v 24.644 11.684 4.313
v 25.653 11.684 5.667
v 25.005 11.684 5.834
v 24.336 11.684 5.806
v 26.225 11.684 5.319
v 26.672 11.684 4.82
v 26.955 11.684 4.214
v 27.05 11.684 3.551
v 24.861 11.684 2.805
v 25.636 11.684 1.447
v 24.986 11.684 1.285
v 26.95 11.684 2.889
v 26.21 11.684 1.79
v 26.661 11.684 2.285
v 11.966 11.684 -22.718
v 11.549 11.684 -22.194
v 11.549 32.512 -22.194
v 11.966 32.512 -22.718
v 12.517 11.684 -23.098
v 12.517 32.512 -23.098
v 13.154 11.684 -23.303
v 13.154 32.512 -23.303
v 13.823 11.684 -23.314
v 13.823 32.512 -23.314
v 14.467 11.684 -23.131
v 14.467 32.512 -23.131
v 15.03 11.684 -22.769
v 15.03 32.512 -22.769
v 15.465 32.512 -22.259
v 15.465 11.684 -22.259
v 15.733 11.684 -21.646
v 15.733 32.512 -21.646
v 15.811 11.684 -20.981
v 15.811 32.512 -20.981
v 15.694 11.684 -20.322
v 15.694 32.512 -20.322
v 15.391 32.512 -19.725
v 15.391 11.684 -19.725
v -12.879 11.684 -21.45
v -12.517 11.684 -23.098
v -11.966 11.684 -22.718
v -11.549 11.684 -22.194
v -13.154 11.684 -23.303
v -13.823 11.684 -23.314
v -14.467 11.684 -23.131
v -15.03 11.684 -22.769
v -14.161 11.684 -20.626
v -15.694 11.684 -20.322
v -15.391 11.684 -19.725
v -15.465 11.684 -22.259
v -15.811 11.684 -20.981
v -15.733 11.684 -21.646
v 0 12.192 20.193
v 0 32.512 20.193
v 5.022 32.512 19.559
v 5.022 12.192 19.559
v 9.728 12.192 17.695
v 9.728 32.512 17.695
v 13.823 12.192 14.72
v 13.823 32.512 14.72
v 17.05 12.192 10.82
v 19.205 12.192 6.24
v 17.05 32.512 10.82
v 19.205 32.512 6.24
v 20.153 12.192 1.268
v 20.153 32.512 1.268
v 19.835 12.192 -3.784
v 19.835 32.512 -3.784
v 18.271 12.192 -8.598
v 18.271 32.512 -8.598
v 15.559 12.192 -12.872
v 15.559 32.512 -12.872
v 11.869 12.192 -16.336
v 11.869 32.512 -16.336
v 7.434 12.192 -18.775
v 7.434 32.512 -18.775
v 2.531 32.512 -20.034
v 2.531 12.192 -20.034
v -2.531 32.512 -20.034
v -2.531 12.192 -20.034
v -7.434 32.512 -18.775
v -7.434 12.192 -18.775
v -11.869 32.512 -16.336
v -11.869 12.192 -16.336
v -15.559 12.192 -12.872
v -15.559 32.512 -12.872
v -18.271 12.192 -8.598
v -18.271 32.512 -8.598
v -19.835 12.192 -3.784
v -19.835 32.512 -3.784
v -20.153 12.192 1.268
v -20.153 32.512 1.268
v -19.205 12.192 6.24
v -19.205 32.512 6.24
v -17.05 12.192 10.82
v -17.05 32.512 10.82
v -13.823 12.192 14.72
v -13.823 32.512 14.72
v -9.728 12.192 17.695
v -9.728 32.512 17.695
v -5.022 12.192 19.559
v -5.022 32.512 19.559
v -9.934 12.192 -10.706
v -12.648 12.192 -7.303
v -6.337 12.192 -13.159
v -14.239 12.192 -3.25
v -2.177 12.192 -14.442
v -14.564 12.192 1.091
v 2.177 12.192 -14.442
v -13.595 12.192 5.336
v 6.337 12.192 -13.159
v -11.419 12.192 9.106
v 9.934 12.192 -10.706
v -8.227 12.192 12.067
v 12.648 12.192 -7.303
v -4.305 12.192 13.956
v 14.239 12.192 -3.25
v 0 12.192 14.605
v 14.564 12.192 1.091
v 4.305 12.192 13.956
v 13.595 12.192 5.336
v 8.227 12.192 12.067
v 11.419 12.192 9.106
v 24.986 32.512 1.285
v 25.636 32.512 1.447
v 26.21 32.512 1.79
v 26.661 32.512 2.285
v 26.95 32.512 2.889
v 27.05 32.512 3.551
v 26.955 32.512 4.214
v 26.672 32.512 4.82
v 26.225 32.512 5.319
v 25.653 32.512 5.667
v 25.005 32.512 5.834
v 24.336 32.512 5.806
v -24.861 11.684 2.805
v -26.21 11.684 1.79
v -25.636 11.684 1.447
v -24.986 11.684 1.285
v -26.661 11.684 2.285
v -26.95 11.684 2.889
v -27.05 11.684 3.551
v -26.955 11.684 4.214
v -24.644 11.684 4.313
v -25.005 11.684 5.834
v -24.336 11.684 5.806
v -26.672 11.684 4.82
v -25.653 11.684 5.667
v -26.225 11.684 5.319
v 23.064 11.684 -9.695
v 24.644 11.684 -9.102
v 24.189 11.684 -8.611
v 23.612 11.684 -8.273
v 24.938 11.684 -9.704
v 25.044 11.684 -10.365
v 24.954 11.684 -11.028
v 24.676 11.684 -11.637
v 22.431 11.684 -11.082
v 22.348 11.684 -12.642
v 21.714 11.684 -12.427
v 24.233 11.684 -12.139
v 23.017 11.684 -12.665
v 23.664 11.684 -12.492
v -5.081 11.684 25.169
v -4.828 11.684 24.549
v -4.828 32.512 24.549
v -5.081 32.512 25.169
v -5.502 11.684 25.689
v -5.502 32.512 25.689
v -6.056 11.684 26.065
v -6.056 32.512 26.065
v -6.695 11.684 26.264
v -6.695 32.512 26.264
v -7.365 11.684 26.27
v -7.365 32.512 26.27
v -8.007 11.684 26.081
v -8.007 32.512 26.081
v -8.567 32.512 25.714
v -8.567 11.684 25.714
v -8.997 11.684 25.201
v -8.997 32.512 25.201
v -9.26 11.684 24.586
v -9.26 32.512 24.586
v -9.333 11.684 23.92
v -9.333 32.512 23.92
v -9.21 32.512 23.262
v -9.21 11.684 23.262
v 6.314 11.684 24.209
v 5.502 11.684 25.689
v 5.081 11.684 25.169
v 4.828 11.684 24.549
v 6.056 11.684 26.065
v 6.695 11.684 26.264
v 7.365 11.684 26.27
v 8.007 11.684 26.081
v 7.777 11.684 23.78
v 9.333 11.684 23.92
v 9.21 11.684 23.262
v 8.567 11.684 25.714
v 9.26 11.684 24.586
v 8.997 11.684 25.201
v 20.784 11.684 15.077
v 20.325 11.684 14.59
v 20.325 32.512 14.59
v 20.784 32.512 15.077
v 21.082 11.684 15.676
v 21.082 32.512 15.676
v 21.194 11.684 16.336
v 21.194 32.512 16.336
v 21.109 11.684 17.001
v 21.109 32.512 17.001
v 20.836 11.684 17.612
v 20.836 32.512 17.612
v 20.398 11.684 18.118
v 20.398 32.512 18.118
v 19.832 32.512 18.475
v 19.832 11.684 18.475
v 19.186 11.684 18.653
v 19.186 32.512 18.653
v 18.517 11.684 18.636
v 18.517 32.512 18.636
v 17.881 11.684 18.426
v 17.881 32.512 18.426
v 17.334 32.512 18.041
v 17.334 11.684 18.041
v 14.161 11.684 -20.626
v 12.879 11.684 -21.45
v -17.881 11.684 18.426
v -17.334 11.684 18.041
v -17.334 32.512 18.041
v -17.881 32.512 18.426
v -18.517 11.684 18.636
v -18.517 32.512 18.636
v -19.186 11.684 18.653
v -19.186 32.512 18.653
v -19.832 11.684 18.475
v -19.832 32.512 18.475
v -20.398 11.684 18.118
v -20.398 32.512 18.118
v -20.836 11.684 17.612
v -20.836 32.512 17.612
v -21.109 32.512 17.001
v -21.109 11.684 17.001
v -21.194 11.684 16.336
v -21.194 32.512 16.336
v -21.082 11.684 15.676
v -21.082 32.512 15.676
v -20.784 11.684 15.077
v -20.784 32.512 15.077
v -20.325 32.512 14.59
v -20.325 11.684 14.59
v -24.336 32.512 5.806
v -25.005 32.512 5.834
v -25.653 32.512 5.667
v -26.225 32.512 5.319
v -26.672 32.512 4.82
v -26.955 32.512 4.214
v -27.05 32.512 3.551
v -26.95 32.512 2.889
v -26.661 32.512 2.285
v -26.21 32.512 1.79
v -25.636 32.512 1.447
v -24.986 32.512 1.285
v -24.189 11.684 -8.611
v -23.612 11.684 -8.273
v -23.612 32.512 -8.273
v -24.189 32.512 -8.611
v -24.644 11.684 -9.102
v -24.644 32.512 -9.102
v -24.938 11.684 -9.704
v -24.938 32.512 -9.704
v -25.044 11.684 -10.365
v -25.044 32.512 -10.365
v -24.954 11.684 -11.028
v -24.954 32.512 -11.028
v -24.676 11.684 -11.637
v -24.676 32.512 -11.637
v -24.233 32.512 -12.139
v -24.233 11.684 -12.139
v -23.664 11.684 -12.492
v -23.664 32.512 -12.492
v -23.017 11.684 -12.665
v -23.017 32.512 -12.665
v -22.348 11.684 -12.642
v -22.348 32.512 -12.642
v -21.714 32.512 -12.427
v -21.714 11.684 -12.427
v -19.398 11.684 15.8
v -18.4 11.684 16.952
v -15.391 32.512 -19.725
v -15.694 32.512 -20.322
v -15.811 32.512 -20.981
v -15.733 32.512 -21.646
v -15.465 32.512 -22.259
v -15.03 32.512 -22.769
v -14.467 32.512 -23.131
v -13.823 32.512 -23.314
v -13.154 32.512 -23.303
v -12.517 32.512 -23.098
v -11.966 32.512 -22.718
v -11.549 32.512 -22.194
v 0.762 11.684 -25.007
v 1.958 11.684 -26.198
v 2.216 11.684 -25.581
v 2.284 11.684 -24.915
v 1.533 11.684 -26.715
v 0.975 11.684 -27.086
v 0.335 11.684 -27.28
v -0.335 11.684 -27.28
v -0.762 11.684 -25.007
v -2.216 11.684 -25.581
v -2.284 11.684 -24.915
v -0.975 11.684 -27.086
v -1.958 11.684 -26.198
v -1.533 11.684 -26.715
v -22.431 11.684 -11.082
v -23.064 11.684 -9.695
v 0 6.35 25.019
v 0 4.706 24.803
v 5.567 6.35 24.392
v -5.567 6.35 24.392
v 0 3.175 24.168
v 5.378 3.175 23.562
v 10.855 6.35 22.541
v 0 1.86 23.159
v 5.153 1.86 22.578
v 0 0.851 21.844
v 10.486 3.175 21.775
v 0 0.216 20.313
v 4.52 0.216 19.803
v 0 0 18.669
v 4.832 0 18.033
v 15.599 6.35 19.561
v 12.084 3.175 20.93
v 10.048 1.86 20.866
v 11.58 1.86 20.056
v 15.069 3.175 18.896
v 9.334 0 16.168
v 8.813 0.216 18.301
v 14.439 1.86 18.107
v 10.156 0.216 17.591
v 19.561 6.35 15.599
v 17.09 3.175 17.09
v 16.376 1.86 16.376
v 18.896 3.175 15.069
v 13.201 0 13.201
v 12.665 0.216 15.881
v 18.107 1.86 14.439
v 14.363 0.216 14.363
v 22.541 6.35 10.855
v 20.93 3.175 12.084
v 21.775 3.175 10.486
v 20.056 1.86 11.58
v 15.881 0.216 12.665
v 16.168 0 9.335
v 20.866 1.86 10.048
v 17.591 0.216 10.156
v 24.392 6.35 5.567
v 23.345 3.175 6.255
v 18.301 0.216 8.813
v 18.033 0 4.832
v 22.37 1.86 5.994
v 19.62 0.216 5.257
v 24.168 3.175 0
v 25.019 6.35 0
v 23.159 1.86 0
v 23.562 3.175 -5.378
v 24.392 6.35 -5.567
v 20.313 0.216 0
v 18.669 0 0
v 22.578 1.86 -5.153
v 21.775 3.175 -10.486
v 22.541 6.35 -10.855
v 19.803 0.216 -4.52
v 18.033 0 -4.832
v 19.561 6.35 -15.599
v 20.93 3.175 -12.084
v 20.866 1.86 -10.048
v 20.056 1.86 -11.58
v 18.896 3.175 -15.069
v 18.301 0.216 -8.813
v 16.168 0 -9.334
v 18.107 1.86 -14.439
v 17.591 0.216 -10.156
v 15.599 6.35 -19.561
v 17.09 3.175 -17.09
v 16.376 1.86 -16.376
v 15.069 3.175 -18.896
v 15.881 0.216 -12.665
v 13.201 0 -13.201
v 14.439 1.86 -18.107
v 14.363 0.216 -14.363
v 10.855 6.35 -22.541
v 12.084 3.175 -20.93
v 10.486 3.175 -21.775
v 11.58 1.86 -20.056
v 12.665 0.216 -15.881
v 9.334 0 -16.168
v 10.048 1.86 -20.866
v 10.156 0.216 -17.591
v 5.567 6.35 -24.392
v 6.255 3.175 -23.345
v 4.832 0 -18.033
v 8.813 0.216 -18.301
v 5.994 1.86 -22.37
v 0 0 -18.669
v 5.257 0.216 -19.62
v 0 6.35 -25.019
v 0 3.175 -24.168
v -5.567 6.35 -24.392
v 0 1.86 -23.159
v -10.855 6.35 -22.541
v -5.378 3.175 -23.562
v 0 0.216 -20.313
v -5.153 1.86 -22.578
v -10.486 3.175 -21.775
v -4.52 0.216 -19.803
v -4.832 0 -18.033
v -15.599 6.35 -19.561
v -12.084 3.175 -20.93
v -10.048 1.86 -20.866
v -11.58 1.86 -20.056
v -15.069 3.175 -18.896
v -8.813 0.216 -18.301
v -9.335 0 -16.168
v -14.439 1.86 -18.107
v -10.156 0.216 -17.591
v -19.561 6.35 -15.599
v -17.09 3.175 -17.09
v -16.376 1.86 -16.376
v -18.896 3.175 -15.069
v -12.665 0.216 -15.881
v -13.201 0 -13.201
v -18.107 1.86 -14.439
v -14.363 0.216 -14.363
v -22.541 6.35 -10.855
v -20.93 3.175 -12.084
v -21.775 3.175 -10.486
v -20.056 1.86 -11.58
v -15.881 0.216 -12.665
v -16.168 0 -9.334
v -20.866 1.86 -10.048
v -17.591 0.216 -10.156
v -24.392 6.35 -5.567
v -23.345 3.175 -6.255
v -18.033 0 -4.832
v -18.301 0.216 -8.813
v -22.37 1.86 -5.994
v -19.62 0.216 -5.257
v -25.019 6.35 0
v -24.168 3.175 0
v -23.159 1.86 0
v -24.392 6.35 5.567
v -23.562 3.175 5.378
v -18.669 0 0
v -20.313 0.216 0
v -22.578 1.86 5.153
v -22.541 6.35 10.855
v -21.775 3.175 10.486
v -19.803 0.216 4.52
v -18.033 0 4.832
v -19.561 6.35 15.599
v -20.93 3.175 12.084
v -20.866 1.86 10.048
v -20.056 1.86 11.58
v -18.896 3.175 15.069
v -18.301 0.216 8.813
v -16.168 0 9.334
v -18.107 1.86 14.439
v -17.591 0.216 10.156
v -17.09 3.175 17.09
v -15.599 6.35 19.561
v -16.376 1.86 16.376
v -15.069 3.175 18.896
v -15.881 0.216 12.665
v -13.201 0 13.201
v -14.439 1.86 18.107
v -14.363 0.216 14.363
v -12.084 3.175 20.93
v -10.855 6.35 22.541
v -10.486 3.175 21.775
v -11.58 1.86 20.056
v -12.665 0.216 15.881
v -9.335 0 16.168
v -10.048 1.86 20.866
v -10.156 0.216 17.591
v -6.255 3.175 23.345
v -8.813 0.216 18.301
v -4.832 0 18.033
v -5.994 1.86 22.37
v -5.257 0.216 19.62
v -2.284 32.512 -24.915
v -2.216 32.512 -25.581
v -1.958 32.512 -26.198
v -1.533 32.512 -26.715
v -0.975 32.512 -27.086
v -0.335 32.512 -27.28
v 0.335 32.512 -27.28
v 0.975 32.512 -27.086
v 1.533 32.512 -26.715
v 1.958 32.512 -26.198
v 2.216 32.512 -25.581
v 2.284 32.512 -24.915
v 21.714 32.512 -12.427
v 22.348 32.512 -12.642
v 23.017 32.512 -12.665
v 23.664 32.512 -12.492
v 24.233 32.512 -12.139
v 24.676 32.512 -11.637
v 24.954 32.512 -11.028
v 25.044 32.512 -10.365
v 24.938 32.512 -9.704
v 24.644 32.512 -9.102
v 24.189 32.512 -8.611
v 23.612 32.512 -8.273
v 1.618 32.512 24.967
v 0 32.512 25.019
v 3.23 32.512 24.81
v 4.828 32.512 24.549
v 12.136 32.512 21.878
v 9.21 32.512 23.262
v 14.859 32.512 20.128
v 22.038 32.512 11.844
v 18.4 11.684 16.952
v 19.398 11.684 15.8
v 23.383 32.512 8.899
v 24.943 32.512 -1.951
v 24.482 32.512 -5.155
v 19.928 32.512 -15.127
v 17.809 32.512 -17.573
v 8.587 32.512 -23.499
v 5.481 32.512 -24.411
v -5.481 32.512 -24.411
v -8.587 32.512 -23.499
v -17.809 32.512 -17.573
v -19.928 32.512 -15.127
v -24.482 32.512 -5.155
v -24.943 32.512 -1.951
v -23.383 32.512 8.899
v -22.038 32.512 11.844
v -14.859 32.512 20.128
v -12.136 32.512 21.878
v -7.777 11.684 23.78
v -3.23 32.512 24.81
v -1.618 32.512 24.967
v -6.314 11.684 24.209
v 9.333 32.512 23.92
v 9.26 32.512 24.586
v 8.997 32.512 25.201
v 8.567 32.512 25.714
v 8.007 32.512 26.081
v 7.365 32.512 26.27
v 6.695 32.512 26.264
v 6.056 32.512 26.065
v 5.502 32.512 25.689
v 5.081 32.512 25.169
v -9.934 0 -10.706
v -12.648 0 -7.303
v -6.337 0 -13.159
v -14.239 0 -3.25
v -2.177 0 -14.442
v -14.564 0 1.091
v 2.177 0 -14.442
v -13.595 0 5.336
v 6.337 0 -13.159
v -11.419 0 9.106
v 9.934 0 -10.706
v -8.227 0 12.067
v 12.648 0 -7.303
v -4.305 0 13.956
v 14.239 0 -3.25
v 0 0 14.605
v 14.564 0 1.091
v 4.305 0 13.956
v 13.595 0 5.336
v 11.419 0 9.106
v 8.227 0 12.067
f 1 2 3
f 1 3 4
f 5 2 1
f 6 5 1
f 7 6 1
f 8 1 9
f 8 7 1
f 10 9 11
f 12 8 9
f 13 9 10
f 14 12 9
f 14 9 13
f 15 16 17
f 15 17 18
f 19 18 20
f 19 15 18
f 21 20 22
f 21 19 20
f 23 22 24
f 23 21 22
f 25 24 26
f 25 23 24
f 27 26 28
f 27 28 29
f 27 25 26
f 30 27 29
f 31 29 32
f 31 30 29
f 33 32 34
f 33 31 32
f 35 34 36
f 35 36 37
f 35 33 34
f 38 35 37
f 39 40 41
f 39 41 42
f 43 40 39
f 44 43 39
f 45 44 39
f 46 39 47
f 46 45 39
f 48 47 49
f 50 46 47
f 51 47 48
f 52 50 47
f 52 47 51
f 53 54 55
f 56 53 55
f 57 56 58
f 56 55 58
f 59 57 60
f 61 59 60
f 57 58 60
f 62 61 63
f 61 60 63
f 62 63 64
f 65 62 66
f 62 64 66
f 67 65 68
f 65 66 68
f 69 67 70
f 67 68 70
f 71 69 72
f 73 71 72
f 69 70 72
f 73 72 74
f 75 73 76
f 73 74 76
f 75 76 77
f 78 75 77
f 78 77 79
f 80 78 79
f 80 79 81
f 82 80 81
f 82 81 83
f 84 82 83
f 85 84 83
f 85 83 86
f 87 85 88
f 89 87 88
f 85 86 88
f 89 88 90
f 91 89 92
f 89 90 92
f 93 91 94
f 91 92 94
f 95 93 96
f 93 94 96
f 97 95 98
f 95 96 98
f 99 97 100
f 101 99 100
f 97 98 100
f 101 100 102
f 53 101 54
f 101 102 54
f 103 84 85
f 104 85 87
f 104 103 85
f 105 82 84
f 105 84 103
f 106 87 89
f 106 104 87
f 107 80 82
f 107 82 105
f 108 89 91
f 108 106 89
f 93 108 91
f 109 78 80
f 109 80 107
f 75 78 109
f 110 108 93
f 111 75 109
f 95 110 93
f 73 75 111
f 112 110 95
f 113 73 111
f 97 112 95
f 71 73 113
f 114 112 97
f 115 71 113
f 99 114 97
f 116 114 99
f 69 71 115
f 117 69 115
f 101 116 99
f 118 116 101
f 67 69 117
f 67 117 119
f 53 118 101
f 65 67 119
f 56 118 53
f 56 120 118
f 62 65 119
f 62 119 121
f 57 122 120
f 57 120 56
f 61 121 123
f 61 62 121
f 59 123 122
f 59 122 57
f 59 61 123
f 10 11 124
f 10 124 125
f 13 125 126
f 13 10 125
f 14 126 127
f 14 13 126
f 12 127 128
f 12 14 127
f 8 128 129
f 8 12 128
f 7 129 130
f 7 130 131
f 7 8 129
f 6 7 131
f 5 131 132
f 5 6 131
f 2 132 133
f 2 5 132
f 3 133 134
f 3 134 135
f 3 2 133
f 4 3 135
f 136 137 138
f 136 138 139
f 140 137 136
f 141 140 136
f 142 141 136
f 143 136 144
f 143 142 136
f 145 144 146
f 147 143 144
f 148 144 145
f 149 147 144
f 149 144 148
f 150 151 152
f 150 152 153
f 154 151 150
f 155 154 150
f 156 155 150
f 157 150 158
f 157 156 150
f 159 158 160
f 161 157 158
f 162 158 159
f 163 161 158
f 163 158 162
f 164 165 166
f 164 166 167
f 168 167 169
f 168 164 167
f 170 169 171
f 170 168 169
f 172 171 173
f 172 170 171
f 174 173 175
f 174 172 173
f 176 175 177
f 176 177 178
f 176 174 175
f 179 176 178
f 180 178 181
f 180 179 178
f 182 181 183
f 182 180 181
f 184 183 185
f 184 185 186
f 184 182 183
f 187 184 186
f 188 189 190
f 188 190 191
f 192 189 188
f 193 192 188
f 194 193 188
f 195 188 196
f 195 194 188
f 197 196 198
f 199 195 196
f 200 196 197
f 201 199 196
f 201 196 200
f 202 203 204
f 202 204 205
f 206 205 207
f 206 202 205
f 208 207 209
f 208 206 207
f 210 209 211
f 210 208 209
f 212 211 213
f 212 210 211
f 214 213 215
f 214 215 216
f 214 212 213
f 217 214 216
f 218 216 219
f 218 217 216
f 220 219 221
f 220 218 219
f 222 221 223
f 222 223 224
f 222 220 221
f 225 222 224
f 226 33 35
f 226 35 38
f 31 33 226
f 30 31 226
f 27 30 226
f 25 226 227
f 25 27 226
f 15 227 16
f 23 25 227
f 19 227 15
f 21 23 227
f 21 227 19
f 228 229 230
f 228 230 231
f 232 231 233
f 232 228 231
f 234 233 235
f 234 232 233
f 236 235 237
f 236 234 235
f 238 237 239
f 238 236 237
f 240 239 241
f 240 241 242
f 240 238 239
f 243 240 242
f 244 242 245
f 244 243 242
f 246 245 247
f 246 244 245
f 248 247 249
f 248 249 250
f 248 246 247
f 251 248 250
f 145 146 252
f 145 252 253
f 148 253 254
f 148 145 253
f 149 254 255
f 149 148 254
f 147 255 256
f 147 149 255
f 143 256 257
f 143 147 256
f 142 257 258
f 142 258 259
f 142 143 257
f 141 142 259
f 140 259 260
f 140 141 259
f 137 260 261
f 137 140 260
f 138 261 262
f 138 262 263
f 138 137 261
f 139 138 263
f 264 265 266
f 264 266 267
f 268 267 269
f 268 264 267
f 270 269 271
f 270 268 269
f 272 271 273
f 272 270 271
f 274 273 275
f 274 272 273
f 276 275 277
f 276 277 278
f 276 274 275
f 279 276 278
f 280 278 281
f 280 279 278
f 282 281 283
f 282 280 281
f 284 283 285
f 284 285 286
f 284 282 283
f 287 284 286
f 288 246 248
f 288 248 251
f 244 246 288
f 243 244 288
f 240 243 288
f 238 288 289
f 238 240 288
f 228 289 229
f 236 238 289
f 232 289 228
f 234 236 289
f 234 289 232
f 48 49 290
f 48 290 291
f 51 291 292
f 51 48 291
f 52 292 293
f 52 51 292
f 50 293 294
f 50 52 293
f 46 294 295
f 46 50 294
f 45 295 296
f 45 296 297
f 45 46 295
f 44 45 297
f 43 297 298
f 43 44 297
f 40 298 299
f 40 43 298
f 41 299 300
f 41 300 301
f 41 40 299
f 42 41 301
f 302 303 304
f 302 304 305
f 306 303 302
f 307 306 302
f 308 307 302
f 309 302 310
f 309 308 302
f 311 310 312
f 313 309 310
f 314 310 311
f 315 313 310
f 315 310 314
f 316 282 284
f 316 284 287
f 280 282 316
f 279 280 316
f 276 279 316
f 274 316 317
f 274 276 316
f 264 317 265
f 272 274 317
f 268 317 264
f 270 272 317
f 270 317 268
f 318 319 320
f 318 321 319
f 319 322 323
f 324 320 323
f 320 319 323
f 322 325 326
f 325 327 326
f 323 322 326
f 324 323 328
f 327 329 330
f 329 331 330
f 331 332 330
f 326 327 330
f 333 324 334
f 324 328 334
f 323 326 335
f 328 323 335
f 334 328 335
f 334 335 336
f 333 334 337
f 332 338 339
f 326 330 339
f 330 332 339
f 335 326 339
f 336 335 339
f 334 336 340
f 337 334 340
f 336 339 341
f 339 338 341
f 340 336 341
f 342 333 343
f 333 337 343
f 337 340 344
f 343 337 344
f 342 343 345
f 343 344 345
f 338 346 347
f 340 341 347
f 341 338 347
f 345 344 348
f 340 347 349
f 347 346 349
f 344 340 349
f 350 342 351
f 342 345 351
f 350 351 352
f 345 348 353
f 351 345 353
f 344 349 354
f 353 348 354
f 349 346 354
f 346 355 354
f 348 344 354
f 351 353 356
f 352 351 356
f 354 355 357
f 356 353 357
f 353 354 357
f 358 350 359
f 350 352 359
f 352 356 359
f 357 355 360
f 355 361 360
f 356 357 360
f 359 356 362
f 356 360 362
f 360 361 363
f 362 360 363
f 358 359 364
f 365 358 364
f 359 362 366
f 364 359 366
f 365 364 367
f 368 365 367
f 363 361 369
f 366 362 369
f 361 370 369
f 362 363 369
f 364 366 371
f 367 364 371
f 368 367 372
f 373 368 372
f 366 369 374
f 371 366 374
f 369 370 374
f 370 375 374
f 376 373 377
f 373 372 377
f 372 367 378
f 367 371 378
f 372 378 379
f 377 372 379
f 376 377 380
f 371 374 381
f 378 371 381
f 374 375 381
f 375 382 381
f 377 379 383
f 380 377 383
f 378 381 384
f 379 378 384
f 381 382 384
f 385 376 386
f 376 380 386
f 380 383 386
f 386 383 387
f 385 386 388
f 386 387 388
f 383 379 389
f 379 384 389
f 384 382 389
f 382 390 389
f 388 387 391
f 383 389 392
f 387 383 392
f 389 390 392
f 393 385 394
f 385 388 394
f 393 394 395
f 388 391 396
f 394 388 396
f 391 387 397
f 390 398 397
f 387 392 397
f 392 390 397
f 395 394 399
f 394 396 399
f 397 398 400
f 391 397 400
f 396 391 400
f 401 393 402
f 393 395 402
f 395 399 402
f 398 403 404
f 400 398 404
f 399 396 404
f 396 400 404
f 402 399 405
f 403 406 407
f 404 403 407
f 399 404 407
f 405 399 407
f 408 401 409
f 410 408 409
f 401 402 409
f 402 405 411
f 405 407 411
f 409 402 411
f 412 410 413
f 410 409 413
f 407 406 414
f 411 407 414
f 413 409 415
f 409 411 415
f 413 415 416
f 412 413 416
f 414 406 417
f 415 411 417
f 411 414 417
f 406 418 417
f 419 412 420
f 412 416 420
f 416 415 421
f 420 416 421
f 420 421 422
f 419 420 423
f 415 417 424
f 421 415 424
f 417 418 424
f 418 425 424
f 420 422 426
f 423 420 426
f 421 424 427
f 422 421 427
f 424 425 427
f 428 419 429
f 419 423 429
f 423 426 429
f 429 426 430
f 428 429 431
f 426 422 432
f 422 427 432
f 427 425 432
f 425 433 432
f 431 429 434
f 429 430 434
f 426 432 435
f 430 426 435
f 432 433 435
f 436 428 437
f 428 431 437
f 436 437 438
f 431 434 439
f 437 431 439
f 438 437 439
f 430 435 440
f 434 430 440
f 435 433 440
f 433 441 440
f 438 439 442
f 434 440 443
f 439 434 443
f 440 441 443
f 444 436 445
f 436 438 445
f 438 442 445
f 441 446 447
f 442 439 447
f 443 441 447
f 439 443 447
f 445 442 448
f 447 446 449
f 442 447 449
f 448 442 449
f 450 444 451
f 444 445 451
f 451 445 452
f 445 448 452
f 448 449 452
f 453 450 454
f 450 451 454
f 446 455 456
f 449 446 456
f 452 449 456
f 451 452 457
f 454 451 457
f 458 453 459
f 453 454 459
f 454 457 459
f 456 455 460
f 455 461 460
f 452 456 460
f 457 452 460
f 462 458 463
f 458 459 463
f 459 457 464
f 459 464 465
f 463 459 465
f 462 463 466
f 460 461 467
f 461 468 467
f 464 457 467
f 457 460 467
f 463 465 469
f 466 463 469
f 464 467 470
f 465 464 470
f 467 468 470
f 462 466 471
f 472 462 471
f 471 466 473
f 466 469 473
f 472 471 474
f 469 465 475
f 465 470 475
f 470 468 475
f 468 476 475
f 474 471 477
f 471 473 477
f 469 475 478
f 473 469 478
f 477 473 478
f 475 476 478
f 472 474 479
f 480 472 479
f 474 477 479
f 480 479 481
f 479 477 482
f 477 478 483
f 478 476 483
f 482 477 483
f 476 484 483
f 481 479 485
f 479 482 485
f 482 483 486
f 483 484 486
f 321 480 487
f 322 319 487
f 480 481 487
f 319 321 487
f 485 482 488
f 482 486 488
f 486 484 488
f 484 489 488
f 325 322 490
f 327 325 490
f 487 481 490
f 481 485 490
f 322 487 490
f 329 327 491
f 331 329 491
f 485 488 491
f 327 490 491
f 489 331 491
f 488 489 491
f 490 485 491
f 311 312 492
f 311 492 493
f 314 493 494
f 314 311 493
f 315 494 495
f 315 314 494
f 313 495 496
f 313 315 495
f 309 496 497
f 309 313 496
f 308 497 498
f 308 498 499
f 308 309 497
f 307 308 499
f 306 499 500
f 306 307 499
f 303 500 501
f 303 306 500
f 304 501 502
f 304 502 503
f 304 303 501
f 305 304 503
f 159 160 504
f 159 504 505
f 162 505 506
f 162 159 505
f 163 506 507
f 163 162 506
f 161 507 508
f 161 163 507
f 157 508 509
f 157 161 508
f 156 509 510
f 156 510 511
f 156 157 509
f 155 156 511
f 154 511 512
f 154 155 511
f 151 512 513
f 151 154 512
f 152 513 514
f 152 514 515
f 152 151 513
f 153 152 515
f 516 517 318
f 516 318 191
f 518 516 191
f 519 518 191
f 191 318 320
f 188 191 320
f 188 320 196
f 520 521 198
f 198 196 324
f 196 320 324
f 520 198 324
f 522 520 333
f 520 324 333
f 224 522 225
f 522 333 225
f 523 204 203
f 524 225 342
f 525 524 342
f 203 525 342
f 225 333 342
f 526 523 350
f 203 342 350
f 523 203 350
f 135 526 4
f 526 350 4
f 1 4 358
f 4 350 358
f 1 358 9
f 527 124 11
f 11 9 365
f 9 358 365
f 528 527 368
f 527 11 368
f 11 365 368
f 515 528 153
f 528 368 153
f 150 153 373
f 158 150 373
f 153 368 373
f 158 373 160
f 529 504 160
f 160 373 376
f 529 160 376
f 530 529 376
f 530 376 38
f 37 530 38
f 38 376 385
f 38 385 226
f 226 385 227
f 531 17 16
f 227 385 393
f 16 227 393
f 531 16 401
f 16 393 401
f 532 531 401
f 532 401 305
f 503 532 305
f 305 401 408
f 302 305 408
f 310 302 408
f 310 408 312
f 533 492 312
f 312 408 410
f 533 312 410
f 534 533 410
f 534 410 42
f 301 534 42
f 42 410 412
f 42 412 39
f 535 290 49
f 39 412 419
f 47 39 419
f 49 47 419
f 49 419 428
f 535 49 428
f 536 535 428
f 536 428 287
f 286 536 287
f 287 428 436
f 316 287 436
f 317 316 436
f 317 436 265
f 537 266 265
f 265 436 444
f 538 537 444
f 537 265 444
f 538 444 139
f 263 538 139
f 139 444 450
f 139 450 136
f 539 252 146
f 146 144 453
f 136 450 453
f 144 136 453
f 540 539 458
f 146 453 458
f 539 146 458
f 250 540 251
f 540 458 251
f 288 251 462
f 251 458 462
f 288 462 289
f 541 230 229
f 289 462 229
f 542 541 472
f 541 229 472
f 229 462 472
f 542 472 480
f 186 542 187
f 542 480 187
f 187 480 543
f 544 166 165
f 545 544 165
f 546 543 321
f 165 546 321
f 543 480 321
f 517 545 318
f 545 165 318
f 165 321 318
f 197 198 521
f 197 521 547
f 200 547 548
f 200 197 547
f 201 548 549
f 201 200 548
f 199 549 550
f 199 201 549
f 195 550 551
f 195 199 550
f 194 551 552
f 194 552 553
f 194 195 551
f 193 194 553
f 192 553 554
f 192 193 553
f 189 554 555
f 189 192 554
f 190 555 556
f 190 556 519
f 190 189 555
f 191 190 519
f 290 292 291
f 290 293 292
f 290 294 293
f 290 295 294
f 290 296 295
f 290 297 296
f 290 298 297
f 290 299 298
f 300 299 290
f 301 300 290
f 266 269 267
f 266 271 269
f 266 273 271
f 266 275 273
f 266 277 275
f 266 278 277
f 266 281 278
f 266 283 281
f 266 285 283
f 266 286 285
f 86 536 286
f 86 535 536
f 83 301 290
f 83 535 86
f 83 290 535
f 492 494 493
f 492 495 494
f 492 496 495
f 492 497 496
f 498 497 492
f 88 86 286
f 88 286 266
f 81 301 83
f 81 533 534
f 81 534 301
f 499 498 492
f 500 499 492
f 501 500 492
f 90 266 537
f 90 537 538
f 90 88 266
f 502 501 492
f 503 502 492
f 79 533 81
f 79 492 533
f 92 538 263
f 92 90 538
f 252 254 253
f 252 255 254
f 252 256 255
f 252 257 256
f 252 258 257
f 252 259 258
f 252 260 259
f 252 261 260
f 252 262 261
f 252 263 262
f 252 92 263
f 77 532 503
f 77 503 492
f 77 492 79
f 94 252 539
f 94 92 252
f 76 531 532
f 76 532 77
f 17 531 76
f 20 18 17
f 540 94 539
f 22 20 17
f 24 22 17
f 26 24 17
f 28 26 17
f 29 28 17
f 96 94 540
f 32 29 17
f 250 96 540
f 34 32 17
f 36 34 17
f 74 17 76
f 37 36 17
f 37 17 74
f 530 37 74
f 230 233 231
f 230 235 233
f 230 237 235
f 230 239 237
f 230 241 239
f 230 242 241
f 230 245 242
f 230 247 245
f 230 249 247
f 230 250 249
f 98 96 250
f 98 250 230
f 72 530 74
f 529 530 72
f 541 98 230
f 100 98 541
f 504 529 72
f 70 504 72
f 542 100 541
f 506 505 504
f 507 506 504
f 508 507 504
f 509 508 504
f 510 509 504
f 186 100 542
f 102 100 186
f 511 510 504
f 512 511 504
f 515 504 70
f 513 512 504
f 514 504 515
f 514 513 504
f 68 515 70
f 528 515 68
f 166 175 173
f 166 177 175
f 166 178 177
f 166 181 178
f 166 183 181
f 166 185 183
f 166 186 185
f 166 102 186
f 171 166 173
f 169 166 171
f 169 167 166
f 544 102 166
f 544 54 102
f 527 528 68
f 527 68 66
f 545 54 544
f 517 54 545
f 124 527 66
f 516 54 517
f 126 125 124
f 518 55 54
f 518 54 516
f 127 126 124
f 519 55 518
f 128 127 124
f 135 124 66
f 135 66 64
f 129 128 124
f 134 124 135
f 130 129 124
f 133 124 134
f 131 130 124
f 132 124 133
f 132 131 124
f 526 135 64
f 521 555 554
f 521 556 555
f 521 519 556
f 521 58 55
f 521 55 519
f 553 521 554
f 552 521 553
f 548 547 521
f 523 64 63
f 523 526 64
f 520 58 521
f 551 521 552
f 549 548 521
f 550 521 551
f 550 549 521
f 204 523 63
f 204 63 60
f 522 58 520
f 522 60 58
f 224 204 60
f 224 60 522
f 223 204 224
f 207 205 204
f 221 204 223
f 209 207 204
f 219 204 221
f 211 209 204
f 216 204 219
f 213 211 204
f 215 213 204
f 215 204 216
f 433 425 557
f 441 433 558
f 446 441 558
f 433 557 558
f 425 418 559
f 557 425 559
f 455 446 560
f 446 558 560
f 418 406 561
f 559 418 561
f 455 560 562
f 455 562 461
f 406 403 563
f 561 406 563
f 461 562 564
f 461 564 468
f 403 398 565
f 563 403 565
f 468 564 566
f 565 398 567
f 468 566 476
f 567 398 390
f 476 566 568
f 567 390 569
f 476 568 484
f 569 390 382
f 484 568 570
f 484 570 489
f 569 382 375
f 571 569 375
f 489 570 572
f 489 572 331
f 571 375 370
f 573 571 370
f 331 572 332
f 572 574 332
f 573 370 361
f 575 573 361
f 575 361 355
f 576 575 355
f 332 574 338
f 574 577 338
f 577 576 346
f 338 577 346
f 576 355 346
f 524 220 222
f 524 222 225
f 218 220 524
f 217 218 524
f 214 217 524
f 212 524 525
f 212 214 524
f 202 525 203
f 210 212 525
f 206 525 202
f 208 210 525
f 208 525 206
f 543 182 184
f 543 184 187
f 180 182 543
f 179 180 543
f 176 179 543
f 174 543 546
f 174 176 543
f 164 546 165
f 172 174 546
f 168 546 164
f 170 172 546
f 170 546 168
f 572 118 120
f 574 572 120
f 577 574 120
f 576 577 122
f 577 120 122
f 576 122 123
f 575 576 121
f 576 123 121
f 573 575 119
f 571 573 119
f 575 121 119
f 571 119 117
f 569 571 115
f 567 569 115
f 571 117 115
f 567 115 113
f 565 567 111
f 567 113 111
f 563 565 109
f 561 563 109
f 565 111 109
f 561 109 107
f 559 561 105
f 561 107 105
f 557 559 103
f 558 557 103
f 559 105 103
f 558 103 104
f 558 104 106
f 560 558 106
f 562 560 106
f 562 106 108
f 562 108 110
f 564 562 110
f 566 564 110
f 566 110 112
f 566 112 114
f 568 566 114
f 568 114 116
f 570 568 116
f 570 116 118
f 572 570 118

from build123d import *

# Parameters (mm, degrees)
SKETCH1_R           = 25.019
BOSS_EXTRUDE1_DEPTH = 32.512
SKETCH2_R           = 14.605
CUT_EXTRUDE1_DEPTH  = 32.512
BOSS_EXTRUDE2_START = -20.828
BOSS_EXTRUDE2_DEPTH = 20.828
CIRPATTERN1_COUNT   = 11
FILLET1_R           = 6.35
SKETCH4_R           = 20.193
CUT_EXTRUDE2_DEPTH  = 20.32


with BuildPart() as part:
    # Sketch1 → Boss-Extrude1 (new body)
    with BuildSketch(Plane(origin=(0, 0, 0), x_dir=(1, 0, 0), z_dir=(0, 1, 0))):
        with Locations(Location((0, 0, 0), (0, 0, 270))):
            Circle(SKETCH1_R)
    extrude(amount=BOSS_EXTRUDE1_DEPTH)

    # Sketch2 → Cut-Extrude1 (cut)
    with BuildSketch(Plane(origin=(0, 32.512, 0), x_dir=(1, 0, 0), z_dir=(0, 1, 0))):
        with Locations(Location((0, 0, 0), (0, 0, 270))):
            Circle(SKETCH2_R)
    extrude(amount=-CUT_EXTRUDE1_DEPTH, mode=Mode.SUBTRACT)

    # Sketch3 → Boss-Extrude2 (add)
    with BuildSketch(Plane(origin=(0, 32.512, 0), x_dir=(1, 0, 0), z_dir=(0, 1, 0)).offset(BOSS_EXTRUDE2_START)):
        with BuildLine():
            ThreePointArc((2.283613147, 24.914563452), (0, 25.019), (-2.283613147, 24.914563452))
            ThreePointArc((-2.283613147, 24.914563452), (0, 27.305), (2.283613147, 24.914563452))
        make_face()
    boss_extrude2 = extrude(amount=BOSS_EXTRUDE2_DEPTH)

    # CirPattern1: Boss-Extrude2 ×11 about axis
    cirpattern1_axis = Axis((0, 0, 0), (0, 1, 0))
    for i in range(1, CIRPATTERN1_COUNT):
        add(boss_extrude2.rotate(cirpattern1_axis, i * 360 / CIRPATTERN1_COUNT))

    # Fillet1
    fillet1_edges = [part.edges().sort_by_distance(p)[0] for p in [
        (0, 0, -25.019),
    ]]
    fillet(fillet1_edges, radius=FILLET1_R)

    # Sketch4 → Cut-Extrude2 (cut)
    with BuildSketch(Plane(origin=(0, 32.512, 0), x_dir=(1, 0, 0), z_dir=(0, 1, 0))):
        with Locations(Location((0, 0, 0), (0, 0, 270))):
            Circle(SKETCH4_R)
    extrude(amount=-CUT_EXTRUDE2_DEPTH, mode=Mode.SUBTRACT)


solid = part.part
